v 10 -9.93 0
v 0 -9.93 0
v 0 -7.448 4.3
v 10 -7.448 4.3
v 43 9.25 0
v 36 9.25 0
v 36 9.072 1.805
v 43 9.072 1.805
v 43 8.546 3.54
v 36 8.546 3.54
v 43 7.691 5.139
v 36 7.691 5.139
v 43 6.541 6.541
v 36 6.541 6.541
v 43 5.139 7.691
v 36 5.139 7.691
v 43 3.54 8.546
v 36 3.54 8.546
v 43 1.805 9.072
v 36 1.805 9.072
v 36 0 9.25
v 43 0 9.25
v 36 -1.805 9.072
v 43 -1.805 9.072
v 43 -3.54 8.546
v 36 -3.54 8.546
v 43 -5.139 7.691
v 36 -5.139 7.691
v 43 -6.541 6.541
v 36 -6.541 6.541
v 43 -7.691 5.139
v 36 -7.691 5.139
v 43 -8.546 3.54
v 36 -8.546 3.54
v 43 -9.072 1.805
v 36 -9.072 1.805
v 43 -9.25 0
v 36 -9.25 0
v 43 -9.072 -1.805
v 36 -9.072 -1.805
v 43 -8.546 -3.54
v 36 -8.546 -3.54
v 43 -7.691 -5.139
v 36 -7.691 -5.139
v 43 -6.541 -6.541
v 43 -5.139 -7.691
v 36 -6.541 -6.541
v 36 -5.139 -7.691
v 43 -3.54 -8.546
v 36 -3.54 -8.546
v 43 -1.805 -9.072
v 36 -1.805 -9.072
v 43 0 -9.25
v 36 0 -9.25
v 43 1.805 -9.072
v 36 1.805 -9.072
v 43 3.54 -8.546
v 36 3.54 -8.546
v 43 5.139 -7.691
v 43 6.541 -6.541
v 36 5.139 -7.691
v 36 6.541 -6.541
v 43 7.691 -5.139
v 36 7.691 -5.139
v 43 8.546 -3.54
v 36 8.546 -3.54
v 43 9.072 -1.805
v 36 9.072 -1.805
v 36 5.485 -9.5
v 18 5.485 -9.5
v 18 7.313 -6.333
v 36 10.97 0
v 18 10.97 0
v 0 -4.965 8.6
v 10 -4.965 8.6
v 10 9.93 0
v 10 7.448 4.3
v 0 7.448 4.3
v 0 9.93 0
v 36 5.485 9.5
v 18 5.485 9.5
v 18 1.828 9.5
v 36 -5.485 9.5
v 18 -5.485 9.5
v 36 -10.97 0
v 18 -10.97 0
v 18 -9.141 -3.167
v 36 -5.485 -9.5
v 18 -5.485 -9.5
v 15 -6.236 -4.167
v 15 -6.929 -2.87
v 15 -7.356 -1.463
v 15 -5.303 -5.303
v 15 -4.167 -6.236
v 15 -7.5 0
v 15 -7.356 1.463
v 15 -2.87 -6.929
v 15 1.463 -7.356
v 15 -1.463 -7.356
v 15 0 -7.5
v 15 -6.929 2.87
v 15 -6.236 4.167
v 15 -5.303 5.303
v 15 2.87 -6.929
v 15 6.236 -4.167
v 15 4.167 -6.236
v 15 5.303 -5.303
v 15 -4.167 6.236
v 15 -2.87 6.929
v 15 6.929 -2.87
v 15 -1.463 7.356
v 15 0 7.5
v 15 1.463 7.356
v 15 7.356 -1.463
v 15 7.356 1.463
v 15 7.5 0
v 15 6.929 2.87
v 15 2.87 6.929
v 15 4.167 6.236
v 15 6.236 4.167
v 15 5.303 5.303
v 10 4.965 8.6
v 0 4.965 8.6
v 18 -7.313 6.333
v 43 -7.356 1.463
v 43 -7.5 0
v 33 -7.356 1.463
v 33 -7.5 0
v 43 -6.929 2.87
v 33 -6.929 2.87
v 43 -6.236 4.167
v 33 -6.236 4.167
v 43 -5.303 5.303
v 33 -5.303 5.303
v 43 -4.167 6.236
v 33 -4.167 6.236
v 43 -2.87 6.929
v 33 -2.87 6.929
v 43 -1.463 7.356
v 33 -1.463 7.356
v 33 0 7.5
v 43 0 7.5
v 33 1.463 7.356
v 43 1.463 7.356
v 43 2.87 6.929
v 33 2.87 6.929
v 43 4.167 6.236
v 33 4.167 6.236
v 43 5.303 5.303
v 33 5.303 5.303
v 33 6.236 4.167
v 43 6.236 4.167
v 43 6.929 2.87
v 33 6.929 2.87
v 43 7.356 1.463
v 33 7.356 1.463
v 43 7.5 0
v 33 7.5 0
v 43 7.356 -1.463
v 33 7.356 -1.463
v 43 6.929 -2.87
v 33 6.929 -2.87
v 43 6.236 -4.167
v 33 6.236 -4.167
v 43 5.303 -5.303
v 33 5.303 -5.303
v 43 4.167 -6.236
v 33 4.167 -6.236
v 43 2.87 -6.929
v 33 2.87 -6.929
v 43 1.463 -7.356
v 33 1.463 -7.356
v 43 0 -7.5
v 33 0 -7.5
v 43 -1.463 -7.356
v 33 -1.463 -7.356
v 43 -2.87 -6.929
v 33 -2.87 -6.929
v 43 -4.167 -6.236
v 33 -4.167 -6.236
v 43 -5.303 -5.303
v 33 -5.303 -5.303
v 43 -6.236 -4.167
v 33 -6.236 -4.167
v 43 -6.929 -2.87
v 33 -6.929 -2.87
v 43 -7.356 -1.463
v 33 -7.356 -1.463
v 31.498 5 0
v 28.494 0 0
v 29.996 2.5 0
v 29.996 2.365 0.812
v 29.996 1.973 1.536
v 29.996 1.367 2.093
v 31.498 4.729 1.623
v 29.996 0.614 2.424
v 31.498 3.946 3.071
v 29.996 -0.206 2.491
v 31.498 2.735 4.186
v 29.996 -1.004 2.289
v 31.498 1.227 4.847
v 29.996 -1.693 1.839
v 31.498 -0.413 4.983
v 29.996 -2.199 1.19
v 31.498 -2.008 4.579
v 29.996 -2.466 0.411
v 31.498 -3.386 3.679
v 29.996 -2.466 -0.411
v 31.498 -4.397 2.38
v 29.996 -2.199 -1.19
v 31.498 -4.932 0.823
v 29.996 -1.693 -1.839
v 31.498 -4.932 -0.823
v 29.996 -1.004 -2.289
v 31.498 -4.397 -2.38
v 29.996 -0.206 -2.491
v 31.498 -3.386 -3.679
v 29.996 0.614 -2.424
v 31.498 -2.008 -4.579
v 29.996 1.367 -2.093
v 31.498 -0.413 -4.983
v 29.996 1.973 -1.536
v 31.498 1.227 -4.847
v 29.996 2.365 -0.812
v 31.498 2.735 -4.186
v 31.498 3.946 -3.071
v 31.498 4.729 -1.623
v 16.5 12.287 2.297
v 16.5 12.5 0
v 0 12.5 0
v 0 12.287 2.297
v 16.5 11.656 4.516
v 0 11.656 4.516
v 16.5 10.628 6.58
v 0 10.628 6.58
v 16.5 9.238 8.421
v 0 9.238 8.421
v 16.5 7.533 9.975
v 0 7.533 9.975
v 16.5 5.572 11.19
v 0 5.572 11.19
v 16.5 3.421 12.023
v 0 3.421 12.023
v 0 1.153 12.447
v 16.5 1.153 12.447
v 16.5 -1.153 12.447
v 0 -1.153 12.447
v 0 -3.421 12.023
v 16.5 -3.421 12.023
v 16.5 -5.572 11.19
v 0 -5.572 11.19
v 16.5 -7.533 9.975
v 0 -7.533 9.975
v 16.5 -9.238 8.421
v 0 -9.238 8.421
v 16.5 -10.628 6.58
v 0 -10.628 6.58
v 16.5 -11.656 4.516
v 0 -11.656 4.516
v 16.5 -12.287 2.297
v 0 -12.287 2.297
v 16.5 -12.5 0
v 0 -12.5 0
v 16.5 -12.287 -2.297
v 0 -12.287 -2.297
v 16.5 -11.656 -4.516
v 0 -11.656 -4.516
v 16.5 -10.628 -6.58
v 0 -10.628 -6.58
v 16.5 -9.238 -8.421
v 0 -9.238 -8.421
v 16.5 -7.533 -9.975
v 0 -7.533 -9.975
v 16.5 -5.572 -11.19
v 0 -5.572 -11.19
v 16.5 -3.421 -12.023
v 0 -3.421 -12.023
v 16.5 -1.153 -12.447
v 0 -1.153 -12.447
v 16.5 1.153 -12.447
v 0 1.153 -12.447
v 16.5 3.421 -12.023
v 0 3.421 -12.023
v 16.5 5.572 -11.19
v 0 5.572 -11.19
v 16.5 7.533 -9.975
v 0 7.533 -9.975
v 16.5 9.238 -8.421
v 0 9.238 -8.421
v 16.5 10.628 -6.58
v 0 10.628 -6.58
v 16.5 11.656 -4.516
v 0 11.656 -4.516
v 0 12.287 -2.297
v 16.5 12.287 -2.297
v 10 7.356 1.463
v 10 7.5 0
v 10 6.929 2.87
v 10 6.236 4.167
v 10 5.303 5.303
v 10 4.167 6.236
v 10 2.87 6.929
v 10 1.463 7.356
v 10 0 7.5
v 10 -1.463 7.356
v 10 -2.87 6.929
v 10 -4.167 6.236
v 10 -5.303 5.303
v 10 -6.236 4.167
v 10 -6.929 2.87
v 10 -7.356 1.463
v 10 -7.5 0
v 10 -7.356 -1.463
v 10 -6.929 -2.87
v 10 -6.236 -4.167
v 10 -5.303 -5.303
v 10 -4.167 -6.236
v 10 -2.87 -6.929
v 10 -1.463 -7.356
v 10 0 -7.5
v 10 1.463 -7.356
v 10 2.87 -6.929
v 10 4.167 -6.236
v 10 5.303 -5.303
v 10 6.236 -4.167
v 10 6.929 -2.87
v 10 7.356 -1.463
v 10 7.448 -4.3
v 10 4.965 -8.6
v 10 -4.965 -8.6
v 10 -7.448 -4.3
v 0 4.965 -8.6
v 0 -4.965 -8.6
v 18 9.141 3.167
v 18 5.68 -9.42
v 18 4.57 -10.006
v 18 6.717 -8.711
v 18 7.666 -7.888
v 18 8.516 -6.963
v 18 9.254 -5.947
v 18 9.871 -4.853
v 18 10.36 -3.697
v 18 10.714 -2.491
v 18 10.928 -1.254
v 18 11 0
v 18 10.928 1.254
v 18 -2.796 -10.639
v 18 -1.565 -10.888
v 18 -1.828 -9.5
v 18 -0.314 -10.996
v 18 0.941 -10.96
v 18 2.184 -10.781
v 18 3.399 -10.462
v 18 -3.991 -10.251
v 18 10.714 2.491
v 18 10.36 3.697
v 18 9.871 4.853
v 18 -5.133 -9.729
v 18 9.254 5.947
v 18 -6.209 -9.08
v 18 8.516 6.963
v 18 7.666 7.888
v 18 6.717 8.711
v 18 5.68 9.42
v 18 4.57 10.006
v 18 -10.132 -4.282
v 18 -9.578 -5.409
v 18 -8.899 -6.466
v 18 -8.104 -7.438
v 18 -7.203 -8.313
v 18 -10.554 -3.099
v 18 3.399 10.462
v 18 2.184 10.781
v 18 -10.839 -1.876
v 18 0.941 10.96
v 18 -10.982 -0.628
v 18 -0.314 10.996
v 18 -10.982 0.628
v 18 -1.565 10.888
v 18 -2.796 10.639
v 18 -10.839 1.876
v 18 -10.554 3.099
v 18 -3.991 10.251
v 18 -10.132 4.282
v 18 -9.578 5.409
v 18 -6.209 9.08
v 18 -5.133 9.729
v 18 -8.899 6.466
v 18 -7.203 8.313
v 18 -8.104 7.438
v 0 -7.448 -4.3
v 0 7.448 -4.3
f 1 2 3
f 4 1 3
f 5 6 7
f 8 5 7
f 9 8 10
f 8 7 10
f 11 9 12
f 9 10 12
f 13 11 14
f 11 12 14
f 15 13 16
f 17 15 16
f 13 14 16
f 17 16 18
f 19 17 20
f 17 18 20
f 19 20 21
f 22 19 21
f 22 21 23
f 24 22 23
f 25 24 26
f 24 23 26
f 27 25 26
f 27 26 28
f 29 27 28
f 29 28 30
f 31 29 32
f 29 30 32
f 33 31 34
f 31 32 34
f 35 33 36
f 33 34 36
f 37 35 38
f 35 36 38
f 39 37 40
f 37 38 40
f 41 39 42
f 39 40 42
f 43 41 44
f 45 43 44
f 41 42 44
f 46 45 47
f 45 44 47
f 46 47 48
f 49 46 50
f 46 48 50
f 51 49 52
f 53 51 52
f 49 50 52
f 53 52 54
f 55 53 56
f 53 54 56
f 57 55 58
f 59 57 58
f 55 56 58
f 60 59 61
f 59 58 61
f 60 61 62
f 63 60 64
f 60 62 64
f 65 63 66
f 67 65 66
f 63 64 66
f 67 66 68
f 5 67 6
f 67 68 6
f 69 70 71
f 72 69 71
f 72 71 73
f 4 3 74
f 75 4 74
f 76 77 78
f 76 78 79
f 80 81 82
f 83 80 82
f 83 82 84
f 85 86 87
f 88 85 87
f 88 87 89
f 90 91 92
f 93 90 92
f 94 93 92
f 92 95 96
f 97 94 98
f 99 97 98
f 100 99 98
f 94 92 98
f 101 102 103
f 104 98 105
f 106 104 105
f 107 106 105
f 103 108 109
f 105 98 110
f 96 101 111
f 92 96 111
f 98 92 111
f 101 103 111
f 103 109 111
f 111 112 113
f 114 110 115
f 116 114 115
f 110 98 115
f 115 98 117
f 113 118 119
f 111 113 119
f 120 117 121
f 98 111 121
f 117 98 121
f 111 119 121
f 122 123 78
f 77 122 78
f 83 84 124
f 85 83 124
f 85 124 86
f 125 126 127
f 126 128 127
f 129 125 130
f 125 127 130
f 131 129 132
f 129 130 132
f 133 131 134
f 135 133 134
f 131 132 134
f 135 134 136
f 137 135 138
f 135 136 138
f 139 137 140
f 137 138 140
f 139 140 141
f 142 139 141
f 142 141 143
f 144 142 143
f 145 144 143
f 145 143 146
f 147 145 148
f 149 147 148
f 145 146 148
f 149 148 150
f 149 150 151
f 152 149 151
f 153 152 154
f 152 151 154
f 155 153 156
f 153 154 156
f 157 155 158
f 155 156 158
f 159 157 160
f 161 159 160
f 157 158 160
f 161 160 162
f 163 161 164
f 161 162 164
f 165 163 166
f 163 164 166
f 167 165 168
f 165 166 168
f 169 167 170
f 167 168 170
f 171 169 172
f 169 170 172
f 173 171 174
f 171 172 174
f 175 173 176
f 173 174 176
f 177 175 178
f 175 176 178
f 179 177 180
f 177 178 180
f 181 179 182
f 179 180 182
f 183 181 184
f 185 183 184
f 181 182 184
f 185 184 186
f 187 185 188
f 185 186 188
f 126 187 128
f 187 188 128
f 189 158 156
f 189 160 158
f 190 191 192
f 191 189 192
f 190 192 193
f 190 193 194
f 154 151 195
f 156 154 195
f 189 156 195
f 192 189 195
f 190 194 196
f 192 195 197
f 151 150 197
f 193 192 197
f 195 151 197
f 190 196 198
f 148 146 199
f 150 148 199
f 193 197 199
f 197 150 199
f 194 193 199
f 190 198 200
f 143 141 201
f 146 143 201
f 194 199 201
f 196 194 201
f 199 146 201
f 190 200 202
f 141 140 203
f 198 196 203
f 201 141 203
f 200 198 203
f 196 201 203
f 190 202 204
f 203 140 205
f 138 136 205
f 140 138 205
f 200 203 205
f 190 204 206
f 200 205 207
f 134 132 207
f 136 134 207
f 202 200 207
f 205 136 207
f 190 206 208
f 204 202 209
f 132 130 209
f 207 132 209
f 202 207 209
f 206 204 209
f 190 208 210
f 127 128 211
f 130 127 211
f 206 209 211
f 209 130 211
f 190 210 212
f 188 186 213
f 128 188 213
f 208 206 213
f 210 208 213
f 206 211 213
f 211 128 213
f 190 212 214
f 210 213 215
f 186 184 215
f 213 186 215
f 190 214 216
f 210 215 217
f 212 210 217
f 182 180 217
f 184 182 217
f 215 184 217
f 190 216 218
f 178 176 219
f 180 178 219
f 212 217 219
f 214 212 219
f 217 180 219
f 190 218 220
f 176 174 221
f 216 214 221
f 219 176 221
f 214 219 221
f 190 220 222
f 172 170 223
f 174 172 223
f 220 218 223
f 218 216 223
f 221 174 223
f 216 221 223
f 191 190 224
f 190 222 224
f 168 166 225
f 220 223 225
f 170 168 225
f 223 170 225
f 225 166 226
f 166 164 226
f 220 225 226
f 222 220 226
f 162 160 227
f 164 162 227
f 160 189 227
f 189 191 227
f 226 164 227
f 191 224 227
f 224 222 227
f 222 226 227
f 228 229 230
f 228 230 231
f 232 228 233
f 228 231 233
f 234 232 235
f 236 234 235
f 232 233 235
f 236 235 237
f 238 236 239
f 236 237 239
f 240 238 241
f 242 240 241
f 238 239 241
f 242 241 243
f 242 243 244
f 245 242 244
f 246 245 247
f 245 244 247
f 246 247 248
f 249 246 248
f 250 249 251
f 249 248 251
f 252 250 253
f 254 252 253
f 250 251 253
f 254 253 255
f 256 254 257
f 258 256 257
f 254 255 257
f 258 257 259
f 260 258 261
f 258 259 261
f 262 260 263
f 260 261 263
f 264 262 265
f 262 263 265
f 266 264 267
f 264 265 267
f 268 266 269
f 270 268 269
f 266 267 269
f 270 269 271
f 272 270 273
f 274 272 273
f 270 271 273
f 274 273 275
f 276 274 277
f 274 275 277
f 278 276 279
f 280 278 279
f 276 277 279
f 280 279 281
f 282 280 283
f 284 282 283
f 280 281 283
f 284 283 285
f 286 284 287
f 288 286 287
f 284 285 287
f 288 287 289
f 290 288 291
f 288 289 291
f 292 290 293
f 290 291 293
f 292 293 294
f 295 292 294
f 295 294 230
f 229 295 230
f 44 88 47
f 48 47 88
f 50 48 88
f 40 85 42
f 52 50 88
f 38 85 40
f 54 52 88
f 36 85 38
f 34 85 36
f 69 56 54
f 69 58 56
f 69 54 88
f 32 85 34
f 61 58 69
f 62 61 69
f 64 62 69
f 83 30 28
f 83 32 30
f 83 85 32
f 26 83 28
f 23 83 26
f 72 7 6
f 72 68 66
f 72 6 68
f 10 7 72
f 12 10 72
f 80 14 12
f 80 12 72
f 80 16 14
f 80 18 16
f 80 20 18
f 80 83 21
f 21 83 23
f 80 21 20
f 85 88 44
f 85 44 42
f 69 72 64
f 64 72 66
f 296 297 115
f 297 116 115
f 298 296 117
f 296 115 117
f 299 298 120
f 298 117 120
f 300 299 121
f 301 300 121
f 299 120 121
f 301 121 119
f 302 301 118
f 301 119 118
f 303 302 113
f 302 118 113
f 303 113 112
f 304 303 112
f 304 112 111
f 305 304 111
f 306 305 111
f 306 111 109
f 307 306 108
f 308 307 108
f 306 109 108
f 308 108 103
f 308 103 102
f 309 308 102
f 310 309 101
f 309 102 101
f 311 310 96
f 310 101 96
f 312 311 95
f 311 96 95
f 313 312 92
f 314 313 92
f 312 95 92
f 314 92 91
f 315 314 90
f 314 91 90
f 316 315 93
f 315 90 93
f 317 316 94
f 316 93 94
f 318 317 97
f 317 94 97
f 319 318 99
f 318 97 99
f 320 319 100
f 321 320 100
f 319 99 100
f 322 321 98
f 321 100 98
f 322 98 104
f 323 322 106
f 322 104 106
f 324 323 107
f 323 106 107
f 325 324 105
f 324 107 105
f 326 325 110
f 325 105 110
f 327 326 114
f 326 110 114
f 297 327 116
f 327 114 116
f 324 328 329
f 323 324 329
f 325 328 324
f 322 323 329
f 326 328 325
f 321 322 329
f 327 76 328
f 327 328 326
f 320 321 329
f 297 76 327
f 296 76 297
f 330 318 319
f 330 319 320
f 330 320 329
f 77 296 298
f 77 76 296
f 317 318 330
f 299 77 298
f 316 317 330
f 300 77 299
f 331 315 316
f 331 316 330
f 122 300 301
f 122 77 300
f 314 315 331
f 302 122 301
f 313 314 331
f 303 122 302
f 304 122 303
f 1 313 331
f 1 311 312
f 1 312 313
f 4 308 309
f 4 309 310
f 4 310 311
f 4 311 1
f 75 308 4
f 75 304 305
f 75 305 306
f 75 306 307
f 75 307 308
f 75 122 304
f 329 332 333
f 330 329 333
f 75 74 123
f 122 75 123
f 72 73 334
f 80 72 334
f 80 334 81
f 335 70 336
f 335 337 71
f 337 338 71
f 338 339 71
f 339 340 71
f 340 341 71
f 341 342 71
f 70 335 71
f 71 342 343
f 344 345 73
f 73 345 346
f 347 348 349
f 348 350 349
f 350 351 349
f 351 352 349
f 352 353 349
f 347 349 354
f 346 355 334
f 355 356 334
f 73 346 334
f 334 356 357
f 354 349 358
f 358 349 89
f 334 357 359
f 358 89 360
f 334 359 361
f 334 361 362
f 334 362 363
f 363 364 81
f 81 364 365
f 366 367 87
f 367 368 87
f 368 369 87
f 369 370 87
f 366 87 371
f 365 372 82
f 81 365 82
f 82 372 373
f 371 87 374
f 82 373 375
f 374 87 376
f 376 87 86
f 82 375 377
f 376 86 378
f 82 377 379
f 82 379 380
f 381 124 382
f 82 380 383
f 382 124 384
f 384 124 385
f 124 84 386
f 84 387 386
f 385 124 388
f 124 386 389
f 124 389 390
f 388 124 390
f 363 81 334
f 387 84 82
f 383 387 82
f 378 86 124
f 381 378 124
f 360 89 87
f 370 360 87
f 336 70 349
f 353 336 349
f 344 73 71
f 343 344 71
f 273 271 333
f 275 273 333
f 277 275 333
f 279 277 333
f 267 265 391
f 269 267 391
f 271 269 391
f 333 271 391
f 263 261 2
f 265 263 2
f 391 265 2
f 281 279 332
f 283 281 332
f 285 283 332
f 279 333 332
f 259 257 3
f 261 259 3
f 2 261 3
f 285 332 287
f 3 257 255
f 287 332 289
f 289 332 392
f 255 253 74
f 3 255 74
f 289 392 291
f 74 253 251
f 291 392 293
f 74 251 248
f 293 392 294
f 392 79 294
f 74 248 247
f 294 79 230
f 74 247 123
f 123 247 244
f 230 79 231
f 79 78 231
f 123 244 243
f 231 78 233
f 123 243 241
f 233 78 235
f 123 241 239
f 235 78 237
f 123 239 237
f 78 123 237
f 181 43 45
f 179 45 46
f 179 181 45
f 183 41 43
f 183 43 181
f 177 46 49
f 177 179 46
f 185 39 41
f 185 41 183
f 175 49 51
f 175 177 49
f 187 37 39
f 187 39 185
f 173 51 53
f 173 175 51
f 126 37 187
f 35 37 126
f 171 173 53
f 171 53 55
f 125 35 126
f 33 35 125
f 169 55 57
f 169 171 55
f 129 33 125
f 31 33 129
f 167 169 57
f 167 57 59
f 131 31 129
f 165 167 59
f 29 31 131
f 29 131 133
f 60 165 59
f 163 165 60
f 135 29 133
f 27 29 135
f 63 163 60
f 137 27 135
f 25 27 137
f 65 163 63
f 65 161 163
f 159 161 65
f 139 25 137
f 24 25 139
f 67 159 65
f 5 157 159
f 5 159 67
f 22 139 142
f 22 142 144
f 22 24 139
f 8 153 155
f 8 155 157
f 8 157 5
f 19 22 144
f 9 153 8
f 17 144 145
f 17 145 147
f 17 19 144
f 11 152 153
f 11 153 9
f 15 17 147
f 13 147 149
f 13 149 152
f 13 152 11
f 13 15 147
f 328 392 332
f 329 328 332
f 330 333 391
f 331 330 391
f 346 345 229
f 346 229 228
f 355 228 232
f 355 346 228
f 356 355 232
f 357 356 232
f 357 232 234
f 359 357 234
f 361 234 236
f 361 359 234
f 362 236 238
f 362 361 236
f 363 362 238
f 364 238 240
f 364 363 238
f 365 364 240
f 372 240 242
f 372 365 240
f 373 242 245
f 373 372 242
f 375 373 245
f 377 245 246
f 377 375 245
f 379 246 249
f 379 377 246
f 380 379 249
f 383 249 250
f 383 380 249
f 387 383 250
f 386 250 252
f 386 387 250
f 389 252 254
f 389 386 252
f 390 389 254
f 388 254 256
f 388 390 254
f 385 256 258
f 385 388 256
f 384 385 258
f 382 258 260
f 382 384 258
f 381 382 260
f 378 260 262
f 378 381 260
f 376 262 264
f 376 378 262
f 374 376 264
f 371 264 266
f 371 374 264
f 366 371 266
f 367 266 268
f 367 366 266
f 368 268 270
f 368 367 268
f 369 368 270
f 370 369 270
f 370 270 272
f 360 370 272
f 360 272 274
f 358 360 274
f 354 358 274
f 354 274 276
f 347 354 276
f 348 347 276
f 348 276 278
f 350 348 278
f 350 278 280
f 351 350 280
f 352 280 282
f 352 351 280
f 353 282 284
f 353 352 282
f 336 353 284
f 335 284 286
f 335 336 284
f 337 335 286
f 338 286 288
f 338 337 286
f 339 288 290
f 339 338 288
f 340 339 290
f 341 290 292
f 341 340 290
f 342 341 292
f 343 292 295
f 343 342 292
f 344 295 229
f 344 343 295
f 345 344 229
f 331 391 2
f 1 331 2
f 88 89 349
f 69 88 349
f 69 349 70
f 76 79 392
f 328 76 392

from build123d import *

# Parameters (mm, degrees)
F3_DEPTH  = 10
F5_DEPTH  = 18
F6_R      = 9.25
F7_DEPTH  = 7
F8_SIZE   = 1.5
F10_D     = 15
F10_DEPTH = 10
F10_TIP   = 4.5064546427


with BuildPart() as f1:
    # F0 (on Top) → F1 (revolve)
    with BuildSketch(Plane.XY):
        Polygon((0, 12.5), (0, 8.5), (10, 8.5), (10, 7.5), (15, 7.5), (15, 0), (18, 0), (18, 12.5), align=None)
    revolve(axis=Axis((16.5, 0, 0), (1, 0, 0)))

    # F2 (on face) → F3 (cut)
    with BuildSketch(Plane(origin=(0, 0, 0), x_dir=(0, -1, 0), z_dir=(-1, 0, 0))):
        with BuildLine():
            ThreePointArc((7.4478184814, -4.2999999846), (8.3069621084, -2.2258437793), (8.6, 0))
            ThreePointArc((8.6, 0), (8.3069621251, 2.2258437168), (7.4478185462, 4.2999998725))
            ThreePointArc((7.4478185462, 4.2999998725), (4.3000000638, 7.4478184357), (0, 8.6))
            ThreePointArc((0, 8.6), (-4.3000000291, 7.4478184557), (-7.4478185062, 4.2999999418))
            ThreePointArc((-7.4478185062, 4.2999999418), (-8.6, 4e-08), (-7.4478185462, -4.2999998725))
            ThreePointArc((-7.4478185462, -4.2999998725), (-4.3000000638, -7.4478184357), (0, -8.6))
            ThreePointArc((0, -8.6), (4.3000000077, -7.4478184681), (7.4478184814, -4.2999999846))
        make_face()
        with BuildLine():
            ThreePointArc((7.4478185462, 4.2999998725), (8.3069621251, 2.2258437168), (8.6, 0))
            ThreePointArc((8.6, 0), (8.3069621084, -2.2258437793), (7.4478184814, -4.2999999846))
            Line((7.4478184814, -4.2999999846), (9.9304246301, 0))
            Line((9.9304246301, 0), (7.4478185462, 4.2999998725))
        make_face()
        with BuildLine():
            ThreePointArc((0, 8.6), (4.3000000638, 7.4478184357), (7.4478185462, 4.2999998725))
            Line((7.4478185462, 4.2999998725), (4.965212315, 8.6))
            Line((4.965212315, 8.6), (0, 8.6))
        make_face()
        with BuildLine():
            Line((4.965212315, -8.6), (7.4478184814, -4.2999999846))
            ThreePointArc((7.4478184814, -4.2999999846), (4.3000000077, -7.4478184681), (0, -8.6))
            Line((0, -8.6), (4.965212315, -8.6))
        make_face()
        with BuildLine():
            ThreePointArc((-7.4478185062, 4.2999999418), (-4.3000000291, 7.4478184557), (0, 8.6))
            Line((0, 8.6), (-4.965212315, 8.6))
            Line((-4.965212315, 8.6), (-7.4478185062, 4.2999999418))
        make_face()
        with BuildLine():
            Line((-4.965212315, -8.6), (0, -8.6))
            ThreePointArc((0, -8.6), (-4.3000000638, -7.4478184357), (-7.4478185462, -4.2999998725))
            Line((-7.4478185462, -4.2999998725), (-4.965212315, -8.6))
        make_face()
        with BuildLine():
            ThreePointArc((-7.4478185462, -4.2999998725), (-8.6, 4e-08), (-7.4478185062, 4.2999999418))
            Line((-7.4478185062, 4.2999999418), (-9.9304246301, 0))
            Line((-9.9304246301, 0), (-7.4478185462, -4.2999998725))
        make_face()
    extrude(amount=-F3_DEPTH, mode=Mode.SUBTRACT)

    # F4 (on face) → F5 (join)
    with BuildSketch(Plane.YZ.offset(18)):
        Polygon((5.4848275573, 9.5), (-5.4848275573, 9.5), (-10.9696551146, 0), (-5.4848275573, -9.5), (5.4848275573, -9.5), (10.9696551146, 0), align=None)
    extrude(amount=F5_DEPTH)

    # F6 (on face) → F7 (join)
    with BuildSketch(Plane.YZ.offset(36)):
        Circle(F6_R)
    extrude(amount=F7_DEPTH)

    # F8
    f8_edges = [f1.edges().sort_by_distance(p)[0] for p in [
        (18, -12.5, 0),
    ]]
    chamfer(f8_edges, length=F8_SIZE)

    # F10
    with Locations(Plane.YZ.offset(43)):
        with Locations((0, 0)):
            Hole(F10_D / 2, depth=F10_DEPTH)
            with Locations((0, 0, -(F10_DEPTH + F10_TIP / 2))):  # 118° drill point
                Cone(0, F10_D / 2, F10_TIP, mode=Mode.SUBTRACT)


solid = f1.part
